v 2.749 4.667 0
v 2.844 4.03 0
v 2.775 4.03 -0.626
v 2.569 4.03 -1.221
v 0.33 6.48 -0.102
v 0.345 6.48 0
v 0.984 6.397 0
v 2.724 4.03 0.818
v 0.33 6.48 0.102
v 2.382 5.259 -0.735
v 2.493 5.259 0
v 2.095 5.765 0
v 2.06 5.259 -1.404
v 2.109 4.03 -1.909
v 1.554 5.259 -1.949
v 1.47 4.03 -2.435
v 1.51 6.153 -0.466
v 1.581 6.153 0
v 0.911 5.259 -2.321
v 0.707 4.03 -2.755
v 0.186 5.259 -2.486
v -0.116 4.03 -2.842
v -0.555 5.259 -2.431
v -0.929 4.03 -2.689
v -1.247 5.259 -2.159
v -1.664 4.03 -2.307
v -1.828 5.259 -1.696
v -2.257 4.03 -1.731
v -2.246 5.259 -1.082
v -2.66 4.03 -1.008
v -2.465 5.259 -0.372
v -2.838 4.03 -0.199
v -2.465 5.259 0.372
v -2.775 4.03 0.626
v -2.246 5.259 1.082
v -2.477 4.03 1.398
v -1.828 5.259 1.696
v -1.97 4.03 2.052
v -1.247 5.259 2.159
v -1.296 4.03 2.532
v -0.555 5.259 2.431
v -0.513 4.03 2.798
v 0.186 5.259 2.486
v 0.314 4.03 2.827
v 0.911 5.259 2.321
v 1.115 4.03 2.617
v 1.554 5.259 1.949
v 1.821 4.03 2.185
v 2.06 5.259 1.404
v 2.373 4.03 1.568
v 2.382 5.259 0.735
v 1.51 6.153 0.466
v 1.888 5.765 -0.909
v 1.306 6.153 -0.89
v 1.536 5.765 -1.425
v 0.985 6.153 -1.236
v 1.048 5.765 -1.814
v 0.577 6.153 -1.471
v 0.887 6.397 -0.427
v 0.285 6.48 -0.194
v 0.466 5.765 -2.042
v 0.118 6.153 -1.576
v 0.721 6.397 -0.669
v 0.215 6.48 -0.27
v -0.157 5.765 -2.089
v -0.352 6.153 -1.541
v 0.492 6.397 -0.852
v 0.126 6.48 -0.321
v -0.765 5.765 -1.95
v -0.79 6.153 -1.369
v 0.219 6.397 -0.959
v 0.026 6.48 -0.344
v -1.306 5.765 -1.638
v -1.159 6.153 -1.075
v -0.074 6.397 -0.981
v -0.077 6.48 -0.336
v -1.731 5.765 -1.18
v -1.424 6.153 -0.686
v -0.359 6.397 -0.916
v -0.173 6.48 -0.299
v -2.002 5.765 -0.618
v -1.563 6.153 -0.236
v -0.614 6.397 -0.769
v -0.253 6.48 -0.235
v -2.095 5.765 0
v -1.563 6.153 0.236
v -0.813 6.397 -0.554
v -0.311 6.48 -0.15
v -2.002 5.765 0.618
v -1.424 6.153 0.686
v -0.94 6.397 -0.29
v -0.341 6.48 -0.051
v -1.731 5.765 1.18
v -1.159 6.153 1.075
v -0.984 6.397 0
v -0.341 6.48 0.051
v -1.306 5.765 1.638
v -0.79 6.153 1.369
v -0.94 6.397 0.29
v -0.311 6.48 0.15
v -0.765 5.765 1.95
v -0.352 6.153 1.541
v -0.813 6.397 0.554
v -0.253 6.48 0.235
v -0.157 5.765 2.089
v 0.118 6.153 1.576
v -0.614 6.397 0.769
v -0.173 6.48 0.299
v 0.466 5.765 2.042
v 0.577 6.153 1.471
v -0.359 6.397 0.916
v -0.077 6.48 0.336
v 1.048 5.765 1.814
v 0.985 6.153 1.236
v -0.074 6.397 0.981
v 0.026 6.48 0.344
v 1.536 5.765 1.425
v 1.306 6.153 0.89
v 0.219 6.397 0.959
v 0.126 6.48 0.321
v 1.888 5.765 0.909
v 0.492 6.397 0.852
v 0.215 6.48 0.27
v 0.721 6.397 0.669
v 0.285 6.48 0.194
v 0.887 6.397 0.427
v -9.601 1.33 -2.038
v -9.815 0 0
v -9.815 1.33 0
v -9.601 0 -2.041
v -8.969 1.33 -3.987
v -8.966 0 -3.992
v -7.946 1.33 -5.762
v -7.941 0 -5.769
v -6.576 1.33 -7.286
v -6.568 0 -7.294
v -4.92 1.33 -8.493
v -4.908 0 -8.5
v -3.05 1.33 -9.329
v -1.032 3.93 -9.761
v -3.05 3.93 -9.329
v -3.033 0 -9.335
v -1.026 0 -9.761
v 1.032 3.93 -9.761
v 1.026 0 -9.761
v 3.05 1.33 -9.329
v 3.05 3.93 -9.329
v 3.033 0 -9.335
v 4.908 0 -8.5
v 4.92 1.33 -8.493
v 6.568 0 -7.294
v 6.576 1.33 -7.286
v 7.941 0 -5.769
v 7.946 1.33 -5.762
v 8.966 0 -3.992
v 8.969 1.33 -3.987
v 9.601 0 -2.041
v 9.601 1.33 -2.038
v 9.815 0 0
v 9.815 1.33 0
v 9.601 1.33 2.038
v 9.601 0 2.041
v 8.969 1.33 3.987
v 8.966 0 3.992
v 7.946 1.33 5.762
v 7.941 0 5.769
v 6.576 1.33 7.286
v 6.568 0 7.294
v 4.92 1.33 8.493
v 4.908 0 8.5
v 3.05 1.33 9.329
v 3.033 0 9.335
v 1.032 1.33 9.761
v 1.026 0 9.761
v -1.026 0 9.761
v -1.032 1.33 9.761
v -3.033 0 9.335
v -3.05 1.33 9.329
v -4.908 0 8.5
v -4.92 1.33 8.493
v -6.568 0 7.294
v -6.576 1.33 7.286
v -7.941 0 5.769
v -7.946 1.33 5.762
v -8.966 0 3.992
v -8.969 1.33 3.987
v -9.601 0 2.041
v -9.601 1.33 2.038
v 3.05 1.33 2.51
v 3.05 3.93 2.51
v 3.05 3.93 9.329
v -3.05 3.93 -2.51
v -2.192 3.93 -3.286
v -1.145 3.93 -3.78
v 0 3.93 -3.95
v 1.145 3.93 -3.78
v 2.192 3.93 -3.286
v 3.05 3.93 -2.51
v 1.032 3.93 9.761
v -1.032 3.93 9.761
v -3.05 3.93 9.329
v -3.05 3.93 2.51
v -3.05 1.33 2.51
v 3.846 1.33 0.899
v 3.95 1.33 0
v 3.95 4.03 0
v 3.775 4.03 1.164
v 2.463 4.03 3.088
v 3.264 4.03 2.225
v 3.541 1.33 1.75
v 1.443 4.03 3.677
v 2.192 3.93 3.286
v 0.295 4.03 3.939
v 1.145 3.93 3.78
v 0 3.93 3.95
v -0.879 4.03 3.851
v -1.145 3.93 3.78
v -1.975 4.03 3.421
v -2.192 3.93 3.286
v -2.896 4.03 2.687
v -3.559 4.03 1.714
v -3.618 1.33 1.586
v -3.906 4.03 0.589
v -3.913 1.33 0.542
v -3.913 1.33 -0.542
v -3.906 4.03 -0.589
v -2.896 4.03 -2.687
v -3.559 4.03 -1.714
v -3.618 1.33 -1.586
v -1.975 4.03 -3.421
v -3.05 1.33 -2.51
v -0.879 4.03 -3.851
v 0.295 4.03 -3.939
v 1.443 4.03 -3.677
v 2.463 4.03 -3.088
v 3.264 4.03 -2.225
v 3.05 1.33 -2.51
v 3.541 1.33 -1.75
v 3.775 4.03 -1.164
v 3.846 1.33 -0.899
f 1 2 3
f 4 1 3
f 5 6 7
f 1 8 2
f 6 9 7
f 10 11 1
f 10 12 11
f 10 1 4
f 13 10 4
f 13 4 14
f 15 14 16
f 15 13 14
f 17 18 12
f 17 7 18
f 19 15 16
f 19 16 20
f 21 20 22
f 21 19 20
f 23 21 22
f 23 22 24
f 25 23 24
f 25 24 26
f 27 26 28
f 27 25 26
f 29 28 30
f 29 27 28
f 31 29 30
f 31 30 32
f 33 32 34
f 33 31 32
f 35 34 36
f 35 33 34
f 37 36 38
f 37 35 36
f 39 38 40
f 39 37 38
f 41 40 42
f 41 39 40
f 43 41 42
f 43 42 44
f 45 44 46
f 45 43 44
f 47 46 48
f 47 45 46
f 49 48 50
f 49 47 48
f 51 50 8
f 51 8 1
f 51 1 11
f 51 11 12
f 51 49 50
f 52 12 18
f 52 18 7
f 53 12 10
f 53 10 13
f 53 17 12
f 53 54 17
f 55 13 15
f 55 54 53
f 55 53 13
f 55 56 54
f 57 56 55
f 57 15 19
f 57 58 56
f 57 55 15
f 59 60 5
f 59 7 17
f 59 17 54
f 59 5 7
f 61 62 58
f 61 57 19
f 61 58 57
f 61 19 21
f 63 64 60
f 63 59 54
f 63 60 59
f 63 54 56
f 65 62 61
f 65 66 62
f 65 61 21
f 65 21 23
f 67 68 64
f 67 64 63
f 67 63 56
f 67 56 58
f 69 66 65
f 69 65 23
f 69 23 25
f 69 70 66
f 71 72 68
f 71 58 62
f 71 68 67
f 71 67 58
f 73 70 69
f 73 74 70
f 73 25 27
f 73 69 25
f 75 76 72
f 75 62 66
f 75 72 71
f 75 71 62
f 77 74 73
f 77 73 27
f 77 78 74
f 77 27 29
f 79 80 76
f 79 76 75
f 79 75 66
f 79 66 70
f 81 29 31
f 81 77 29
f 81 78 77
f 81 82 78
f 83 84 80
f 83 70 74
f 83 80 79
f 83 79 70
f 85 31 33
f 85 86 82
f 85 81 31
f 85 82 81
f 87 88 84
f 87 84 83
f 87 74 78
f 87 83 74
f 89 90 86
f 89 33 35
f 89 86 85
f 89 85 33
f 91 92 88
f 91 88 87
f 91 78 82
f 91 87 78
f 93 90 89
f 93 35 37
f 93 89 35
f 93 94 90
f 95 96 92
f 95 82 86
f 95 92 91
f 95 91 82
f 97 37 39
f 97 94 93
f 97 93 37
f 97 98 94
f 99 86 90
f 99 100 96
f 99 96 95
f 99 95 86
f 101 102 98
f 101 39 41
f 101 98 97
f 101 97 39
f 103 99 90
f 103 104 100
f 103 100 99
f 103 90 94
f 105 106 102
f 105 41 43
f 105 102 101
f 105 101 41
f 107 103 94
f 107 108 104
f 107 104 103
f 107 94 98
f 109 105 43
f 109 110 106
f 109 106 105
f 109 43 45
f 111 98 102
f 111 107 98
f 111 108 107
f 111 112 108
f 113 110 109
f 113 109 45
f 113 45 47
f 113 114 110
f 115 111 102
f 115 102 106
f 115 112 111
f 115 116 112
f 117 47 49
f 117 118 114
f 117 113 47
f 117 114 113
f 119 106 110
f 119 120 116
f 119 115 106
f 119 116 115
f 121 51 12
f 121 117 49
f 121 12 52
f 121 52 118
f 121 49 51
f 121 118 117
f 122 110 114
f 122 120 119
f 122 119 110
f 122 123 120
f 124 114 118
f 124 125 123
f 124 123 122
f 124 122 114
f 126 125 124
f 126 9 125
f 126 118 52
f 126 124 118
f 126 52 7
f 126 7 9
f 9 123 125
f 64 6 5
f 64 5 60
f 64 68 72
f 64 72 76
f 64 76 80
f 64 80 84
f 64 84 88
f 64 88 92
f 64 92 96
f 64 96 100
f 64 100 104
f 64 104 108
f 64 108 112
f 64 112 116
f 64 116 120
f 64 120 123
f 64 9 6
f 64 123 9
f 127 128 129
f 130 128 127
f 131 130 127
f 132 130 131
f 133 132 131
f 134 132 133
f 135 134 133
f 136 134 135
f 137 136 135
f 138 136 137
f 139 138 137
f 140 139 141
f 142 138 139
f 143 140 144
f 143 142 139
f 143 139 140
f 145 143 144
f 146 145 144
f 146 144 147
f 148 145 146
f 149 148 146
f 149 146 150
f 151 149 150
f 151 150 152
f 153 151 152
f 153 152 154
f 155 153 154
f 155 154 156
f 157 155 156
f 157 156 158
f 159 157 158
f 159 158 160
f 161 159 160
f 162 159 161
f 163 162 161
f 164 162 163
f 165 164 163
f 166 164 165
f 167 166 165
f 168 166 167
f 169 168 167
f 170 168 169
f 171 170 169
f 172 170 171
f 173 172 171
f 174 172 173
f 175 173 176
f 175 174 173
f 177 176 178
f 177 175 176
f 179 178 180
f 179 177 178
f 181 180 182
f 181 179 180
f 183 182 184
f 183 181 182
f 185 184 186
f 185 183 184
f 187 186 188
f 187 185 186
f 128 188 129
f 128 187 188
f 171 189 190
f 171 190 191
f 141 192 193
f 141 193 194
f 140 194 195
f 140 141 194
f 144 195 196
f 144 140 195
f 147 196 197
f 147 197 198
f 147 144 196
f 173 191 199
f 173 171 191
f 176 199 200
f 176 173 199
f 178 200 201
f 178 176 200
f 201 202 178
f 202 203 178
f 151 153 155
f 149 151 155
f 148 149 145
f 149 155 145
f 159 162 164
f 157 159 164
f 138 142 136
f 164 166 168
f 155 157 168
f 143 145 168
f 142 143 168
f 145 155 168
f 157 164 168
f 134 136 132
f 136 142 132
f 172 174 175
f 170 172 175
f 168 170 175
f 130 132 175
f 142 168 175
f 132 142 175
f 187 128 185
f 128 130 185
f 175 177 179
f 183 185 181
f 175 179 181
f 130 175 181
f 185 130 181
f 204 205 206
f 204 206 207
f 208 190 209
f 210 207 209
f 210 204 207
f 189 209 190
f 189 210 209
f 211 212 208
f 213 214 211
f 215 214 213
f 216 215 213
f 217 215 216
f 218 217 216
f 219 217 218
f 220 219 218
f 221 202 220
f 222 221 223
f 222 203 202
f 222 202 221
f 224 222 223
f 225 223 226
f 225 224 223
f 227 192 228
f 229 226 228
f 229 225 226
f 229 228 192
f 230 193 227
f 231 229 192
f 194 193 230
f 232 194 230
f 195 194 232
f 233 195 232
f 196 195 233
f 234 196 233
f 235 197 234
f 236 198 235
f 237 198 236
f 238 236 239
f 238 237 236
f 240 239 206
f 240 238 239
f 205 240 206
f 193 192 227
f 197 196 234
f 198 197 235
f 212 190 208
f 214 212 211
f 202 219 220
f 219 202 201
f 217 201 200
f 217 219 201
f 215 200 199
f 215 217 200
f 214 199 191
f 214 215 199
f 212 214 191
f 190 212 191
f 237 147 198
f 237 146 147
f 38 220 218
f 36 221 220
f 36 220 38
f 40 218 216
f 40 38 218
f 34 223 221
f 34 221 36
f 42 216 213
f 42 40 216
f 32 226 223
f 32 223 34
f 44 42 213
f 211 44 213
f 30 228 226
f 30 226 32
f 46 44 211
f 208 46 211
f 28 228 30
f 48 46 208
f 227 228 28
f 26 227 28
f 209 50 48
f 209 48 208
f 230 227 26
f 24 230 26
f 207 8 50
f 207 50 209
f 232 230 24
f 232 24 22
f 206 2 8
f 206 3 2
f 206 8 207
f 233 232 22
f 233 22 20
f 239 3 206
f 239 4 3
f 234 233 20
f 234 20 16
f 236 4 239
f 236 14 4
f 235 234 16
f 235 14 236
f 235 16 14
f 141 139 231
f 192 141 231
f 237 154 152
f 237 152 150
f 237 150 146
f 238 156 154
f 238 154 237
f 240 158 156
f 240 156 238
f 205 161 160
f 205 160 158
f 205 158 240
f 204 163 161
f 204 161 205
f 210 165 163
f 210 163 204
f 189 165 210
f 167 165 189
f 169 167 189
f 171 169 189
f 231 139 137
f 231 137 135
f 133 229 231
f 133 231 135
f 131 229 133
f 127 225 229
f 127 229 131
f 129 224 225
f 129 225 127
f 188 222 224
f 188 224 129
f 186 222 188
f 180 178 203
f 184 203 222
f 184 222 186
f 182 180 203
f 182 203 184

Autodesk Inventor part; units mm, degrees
ref_plane "YZ Plane" through (0, 0, 0) normal (1, 0, 0) x (0, 1, 0)
ref_plane "XZ Plane" through (0, 0, 0) normal (0, 1, 0) x (-1, 0, 0)
ref_plane "XY Plane" through (0, 0, 0) normal (0, 0, 1) x (1, 0, 0)
sketch "Эскиз1" plane through (0, 0, 0) normal (0, 1, 0) x (-1, 0, 0)
  circle A0 centre (0, 0) radius 9.815
  dimension "d0" = 19.63
extrude "Выдавливание1" add sketch "Эскиз1" along normal blind 1.33
sketch "Эскиз2" plane through (0, 1.33, 0) normal (0, 1, 0) x (1, 0, 0)
  circle A0 centre (0, 0) radius 3.95
  dimension "d3" = 7.9
extrude "Выдавливание2" add sketch "Эскиз2" along normal blind 2.7
sketch "Эскиз3" plane through (0, 4.03, 0) normal (0, 1, 0) x (1, 0, 0)
  circle A0 centre (0, 0) radius 2.845
  dimension "d6" = 5.69
extrude "Выдавливание3" add sketch "Эскиз3" along normal blind 2.45
fillet "Сопряжение1" radius 2.5 1 edges at (-2.845, 6.48, 0)
sketch "Эскиз4" plane through (0, 1.33, 0) normal (0, 1, 0) x (1, 0, 0)
  circle A0 centre (0, 0) radius 9.815 projected
  line L0 (3.05, 9.815) -> (3.05, -9.815)
  line L1 (-3.05, 9.815) -> (-3.05, -9.815)
  point P0 (-3.05, 9.3291)
  point P1 (-3.05, -9.3291)
  point P2 (3.05, -9.3291)
  point P3 (3.05, 9.3291)
extrude "Выдавливание4" add sketch "Эскиз4" along normal blind 2.6 contours L0 A0 L1
